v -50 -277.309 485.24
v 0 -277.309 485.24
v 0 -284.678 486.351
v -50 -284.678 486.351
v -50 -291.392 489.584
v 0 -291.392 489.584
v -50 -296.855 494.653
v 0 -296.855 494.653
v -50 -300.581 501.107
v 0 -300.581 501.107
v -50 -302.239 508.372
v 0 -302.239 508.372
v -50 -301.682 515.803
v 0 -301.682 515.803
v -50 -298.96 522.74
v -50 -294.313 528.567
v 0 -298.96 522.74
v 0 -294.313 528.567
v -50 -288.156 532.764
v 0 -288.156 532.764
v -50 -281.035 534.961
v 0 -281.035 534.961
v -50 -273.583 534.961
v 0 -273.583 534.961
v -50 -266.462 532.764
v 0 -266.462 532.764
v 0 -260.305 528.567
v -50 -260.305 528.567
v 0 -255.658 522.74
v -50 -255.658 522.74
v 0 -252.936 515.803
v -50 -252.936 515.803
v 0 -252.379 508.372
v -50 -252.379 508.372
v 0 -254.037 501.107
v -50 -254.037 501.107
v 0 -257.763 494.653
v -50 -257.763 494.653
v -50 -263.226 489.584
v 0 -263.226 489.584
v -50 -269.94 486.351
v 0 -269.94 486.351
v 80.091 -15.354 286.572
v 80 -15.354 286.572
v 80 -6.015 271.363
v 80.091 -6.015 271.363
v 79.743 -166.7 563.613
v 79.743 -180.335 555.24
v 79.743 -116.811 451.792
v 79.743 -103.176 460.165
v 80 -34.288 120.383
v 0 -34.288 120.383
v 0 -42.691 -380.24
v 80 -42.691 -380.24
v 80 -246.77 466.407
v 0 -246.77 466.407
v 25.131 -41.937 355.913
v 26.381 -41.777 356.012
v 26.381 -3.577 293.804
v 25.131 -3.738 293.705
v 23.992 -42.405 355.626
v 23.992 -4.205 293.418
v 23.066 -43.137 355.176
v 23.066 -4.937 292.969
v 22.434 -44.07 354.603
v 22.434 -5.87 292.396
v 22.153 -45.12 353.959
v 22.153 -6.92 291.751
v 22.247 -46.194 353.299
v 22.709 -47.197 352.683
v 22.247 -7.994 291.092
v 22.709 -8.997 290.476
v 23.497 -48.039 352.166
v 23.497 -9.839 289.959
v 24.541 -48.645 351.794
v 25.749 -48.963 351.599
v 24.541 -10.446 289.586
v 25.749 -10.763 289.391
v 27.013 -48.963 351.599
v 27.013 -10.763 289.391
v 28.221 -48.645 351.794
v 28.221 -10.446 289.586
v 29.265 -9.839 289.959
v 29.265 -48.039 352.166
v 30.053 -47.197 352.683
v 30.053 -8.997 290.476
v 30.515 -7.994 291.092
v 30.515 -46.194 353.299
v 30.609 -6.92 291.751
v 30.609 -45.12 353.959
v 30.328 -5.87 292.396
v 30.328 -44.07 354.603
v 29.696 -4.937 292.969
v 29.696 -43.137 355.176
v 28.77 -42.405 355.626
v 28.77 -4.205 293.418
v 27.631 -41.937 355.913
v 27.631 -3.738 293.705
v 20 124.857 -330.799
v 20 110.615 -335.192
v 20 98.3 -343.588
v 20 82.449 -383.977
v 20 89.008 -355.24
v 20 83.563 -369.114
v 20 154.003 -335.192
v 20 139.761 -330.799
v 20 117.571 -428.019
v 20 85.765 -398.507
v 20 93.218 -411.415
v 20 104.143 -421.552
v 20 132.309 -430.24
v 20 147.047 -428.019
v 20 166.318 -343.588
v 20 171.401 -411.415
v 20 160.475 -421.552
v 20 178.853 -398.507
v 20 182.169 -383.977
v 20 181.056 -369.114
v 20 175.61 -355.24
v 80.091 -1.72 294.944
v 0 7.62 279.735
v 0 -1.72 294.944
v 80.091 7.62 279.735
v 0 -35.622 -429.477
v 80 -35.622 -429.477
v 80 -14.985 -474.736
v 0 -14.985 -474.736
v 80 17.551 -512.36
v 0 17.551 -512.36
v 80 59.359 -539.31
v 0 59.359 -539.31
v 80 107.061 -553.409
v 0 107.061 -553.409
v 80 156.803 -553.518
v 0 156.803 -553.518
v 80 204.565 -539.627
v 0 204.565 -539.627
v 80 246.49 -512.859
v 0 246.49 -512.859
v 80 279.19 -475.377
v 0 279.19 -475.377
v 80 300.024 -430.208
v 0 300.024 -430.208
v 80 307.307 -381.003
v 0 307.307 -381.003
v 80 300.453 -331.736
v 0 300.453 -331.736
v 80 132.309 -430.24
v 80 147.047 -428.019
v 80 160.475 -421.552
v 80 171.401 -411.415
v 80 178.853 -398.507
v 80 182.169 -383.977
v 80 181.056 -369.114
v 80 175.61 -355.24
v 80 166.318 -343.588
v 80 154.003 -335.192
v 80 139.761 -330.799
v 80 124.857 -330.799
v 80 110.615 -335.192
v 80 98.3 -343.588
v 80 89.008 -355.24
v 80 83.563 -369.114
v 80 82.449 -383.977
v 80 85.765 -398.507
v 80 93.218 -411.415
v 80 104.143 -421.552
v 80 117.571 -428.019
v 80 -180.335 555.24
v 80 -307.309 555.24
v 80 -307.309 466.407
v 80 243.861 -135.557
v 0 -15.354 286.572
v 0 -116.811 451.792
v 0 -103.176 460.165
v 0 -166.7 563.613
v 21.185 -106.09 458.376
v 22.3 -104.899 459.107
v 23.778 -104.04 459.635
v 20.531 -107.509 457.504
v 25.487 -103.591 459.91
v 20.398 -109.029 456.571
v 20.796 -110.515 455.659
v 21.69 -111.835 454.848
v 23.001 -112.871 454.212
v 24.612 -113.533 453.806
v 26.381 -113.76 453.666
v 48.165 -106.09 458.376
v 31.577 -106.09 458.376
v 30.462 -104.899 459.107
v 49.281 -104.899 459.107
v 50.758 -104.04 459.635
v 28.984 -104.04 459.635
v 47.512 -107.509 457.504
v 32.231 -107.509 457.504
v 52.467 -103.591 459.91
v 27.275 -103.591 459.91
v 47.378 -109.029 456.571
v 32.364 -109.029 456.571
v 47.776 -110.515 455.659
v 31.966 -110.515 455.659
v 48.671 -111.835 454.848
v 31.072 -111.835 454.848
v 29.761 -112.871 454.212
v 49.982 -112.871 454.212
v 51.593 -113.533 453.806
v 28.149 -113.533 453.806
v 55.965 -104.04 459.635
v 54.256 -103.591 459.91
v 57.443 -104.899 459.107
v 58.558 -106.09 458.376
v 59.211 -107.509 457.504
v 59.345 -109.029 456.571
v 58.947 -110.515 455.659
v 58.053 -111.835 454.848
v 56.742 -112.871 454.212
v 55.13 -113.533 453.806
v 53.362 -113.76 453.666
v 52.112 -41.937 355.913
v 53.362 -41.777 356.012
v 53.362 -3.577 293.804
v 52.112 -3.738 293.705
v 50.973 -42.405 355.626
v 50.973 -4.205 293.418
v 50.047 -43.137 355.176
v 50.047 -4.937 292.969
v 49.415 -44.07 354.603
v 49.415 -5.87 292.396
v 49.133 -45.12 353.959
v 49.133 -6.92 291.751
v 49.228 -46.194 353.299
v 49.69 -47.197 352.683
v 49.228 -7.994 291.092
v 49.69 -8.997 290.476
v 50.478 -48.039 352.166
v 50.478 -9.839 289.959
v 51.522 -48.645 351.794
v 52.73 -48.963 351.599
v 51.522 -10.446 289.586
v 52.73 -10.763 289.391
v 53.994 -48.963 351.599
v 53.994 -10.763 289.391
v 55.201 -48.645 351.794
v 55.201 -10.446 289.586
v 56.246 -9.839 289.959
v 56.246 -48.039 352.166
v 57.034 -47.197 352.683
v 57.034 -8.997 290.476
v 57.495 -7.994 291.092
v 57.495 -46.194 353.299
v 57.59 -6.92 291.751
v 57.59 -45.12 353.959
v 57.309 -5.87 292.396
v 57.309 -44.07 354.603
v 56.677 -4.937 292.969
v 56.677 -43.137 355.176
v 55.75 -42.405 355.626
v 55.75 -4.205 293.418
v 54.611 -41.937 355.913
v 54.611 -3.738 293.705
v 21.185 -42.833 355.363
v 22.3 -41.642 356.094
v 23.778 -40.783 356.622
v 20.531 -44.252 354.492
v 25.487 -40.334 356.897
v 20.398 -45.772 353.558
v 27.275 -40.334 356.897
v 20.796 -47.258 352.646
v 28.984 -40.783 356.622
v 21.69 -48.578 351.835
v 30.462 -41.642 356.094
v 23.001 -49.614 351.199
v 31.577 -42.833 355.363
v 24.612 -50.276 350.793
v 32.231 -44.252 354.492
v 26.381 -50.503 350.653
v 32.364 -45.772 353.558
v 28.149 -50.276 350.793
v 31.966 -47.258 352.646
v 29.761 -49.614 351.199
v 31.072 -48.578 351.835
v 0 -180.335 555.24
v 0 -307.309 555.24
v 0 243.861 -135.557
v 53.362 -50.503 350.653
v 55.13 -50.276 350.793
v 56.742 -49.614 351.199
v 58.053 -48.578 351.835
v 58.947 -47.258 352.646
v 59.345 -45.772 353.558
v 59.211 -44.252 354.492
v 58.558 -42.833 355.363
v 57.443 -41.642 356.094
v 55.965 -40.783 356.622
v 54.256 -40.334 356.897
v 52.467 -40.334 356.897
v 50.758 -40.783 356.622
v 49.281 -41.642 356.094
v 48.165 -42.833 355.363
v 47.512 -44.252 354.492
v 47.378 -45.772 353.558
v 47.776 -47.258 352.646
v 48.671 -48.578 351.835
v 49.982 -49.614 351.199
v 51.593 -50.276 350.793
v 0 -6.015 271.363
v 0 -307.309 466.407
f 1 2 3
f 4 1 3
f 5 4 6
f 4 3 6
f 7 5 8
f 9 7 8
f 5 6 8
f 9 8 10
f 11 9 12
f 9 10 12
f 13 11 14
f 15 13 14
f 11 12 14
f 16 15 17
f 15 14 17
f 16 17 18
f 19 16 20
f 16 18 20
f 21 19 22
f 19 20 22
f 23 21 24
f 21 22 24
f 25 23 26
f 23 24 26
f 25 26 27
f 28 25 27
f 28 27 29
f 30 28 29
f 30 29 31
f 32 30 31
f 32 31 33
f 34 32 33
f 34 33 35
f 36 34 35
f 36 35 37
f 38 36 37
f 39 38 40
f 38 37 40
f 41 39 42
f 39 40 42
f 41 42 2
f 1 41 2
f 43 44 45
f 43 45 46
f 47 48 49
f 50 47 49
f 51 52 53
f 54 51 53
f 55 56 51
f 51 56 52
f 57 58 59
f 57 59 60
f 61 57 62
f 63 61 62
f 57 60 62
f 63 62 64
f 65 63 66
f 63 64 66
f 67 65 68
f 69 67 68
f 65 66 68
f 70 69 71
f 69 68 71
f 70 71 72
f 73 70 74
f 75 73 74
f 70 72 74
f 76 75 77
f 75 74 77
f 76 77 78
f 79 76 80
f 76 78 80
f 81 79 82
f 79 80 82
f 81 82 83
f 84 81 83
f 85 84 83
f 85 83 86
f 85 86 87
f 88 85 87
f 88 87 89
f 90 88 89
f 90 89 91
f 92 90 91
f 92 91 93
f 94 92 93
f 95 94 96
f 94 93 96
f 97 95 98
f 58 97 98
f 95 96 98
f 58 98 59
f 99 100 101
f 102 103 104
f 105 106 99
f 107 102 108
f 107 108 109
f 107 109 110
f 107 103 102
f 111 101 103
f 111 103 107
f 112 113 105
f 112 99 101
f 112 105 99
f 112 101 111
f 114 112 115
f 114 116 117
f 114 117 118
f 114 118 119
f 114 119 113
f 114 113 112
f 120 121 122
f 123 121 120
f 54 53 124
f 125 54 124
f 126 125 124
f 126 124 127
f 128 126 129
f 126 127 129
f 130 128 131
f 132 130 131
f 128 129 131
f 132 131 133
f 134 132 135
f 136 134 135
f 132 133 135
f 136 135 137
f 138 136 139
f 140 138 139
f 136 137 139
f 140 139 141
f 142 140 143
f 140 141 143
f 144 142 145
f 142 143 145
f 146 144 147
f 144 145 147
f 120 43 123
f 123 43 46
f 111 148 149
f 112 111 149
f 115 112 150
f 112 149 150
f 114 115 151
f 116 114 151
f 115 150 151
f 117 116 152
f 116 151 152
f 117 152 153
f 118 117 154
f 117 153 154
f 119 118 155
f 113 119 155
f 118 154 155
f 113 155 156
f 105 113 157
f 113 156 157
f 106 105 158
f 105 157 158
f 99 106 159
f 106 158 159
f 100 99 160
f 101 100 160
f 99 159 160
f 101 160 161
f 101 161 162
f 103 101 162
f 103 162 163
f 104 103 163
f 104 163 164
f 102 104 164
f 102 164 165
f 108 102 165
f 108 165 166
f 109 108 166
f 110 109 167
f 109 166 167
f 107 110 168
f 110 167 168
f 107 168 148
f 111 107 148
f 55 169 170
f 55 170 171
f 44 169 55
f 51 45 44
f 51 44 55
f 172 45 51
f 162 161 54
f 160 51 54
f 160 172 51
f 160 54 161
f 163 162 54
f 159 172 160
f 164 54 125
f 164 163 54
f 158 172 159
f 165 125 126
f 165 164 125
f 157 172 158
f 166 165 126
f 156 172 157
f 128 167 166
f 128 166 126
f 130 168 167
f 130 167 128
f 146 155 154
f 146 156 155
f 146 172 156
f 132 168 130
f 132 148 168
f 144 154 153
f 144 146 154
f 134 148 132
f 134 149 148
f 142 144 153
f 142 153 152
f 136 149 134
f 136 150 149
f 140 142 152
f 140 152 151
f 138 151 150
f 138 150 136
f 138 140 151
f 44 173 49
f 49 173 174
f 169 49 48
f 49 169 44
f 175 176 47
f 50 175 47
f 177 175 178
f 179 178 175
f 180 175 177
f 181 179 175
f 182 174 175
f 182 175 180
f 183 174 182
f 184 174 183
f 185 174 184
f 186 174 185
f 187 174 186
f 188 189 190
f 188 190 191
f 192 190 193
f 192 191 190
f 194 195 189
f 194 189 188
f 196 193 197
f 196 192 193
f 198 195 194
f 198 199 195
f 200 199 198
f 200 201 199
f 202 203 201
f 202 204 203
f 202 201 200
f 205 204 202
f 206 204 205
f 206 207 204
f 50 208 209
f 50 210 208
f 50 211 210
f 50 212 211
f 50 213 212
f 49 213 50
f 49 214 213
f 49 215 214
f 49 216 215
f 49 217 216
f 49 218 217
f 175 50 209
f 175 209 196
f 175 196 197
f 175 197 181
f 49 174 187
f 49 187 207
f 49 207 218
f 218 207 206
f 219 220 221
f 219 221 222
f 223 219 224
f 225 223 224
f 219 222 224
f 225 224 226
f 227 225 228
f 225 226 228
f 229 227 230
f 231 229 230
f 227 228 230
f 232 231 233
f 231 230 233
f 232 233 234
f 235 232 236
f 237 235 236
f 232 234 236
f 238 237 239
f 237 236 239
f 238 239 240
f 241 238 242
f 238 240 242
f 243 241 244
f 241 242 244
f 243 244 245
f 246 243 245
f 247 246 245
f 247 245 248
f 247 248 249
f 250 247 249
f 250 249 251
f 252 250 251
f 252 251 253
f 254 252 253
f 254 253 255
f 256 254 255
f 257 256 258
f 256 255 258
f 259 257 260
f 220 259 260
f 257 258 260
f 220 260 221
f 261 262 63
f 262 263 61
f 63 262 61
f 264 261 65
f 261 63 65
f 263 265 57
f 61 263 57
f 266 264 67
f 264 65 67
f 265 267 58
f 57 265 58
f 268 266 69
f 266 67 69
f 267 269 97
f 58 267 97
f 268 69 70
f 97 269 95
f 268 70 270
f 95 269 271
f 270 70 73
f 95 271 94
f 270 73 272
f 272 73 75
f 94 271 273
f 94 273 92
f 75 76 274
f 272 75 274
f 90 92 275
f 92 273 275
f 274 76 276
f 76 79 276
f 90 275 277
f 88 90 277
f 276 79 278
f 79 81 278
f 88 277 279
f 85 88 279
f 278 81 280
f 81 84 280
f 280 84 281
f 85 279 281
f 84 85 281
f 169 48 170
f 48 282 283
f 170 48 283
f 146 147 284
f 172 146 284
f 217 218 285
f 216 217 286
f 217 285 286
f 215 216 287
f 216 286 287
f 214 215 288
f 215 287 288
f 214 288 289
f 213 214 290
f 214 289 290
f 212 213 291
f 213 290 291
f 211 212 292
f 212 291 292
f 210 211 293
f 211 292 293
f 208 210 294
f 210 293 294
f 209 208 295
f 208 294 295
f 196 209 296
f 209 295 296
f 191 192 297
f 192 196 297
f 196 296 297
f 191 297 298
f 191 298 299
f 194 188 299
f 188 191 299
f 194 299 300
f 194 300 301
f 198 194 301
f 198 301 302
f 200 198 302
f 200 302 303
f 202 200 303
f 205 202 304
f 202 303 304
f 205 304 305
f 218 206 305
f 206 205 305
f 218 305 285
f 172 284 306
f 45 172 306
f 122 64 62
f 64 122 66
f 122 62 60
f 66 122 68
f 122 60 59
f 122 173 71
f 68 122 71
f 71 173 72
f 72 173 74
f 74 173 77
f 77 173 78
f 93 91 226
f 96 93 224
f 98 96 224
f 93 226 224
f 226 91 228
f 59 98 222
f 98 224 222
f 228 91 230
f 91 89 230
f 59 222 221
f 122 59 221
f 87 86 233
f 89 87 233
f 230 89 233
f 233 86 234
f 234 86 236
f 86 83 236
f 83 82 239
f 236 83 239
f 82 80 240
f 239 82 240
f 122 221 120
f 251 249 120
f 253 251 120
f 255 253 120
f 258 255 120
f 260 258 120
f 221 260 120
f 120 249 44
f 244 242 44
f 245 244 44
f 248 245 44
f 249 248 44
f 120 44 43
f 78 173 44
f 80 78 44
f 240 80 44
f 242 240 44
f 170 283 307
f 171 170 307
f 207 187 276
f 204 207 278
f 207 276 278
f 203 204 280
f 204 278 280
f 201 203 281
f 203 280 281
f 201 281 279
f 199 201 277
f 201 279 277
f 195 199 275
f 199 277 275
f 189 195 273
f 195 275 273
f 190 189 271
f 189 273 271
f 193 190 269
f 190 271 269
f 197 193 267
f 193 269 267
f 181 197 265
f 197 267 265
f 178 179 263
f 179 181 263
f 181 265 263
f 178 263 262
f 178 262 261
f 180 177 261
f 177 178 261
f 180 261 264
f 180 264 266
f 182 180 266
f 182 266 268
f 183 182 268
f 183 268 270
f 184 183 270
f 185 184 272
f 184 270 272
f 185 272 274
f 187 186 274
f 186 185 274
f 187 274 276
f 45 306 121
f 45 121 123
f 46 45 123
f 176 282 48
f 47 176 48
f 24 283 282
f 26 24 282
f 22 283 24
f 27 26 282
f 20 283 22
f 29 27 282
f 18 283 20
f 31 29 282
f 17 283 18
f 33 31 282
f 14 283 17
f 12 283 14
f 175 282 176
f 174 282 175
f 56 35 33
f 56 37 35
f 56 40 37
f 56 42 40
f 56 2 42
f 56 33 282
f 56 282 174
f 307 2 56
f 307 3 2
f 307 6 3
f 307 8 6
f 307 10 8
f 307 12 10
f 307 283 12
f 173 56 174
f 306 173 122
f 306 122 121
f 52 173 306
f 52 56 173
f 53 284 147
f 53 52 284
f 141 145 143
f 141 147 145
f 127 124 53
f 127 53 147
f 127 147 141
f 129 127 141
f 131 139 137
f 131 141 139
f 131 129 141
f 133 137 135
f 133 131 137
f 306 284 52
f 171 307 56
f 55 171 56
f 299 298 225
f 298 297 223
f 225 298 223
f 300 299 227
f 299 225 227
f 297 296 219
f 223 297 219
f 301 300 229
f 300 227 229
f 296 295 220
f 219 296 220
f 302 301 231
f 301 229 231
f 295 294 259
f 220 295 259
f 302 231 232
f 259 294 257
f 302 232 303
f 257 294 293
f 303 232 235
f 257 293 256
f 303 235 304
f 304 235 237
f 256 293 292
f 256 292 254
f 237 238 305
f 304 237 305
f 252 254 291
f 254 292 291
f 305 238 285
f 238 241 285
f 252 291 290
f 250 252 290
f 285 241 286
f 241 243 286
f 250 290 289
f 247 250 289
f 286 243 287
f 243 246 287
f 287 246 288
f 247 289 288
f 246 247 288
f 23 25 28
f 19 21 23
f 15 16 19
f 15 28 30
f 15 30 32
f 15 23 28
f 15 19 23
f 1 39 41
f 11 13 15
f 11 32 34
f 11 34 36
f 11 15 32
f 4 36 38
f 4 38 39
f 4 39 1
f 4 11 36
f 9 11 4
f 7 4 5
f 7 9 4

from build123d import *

# Parameters (mm, degrees)
BOSS_EXTRUDE1_DEPTH = 80
SKETCH2_R           = 50
CUT_EXTRUDE1_DEPTH  = 60
SKETCH3_R           = 25
BOSS_EXTRUDE2_DEPTH = 50
SKETCH4_W           = 79.742563162
SKETCH4_H           = 121.394874173
SKETCH4_W_2         = 80.091391525
SKETCH4_H_2         = 17.848004333
BOSS_EXTRUDE3_DEPTH = 16
SKETCH5_R           = 4.240124883
BOSS_EXTRUDE4_DEPTH = 73
SKETCH6_R           = 6
BOSS_EXTRUDE5_DEPTH = 130


with BuildPart() as part:
    # Sketch1 → Boss-Extrude1 (new body)
    with BuildSketch(Plane(origin=(0, 0, 0), x_dir=(0, 0, -1), z_dir=(1, 0, 0))):
        with BuildLine():
            Line((331.735644451, 300.452842372), (135.556846967, 243.860961507))
            Line((135.556846967, 243.860961507), (-555.240216811, -180.334724))
            Line((-555.240216811, -180.334724), (-555.240216811, -307.30913461))
            Line((-555.240216811, -307.30913461), (-466.406773101, -307.30913461))
            Line((-466.406773101, -307.30913461), (-466.406773101, -246.770086346))
            Line((-466.406773101, -246.770086346), (-120.382687357, -34.288111609))
            Line((-120.382687357, -34.288111609), (380.240216811, -42.69086539))
            ThreePointArc((380.240216811, -42.69086539), (553.517666092, 156.80251271), (331.735644451, 300.452842372))
        make_face()
    extrude(amount=BOSS_EXTRUDE1_DEPTH)

    # Sketch2 → Cut-Extrude1 (cut)
    with BuildSketch(Plane(origin=(80, 0, 0), x_dir=(0, 0, -1), z_dir=(1, 0, 0))):
        with Locations((380.240216811, 132.30913461)):
            Circle(SKETCH2_R)
    extrude(amount=-CUT_EXTRUDE1_DEPTH, mode=Mode.SUBTRACT)

    # Sketch3 → Boss-Extrude2 (add)
    with BuildSketch(Plane.ZY):
        with Locations(Location((510.240216811, -277.30913461, 0), (0, 0, 180))):
            Circle(SKETCH3_R)
    extrude(amount=BOSS_EXTRUDE2_DEPTH)

    # Sketch4 → Boss-Extrude3 (add)
    with BuildSketch(Plane(origin=(0, 116.638229969, 71.623688797), x_dir=(1, 0, 0), z_dir=(0, 0.8521590965506678, 0.5232827860401582))):
        with Locations((39.871281581, -506.821621235)):
            Rectangle(SKETCH4_W, SKETCH4_H)
        with Locations((40.045695763, -243.31556705)):
            Rectangle(SKETCH4_W_2, SKETCH4_H_2)
    extrude(amount=BOSS_EXTRUDE3_DEPTH)

    # Sketch5 → Boss-Extrude4 (add)
    with BuildSketch(Plane(origin=(0, -131.992624529, 214.948243417), x_dir=(1, 0, 0), z_dir=(0, -0.5232827860401582, 0.8521590965506678))):
        with Locations(Location((26.380961451, 146.454280366, 0), (0, 0, 90))):
            Circle(SKETCH5_R)
        with Locations(Location((53.361601711, 146.454280366, 0), (0, 0, 90))):
            Circle(SKETCH5_R)
    extrude(amount=BOSS_EXTRUDE4_DEPTH)

    # Sketch6 → Boss-Extrude5 (add)
    with BuildSketch(Plane(origin=(0, -170.19226791, 277.155857465), x_dir=(1, 0, 0), z_dir=(0, -0.5232827860401582, 0.8521590965506676))):
        with Locations(Location((26.380961451, 146.454280366, 0), (0, 0, 270))):
            Circle(SKETCH6_R)
        with Locations(Location((53.361601711, 146.454280366, 0), (0, 0, 270))):
            Circle(SKETCH6_R)
    extrude(amount=BOSS_EXTRUDE5_DEPTH)


solid = part.part
